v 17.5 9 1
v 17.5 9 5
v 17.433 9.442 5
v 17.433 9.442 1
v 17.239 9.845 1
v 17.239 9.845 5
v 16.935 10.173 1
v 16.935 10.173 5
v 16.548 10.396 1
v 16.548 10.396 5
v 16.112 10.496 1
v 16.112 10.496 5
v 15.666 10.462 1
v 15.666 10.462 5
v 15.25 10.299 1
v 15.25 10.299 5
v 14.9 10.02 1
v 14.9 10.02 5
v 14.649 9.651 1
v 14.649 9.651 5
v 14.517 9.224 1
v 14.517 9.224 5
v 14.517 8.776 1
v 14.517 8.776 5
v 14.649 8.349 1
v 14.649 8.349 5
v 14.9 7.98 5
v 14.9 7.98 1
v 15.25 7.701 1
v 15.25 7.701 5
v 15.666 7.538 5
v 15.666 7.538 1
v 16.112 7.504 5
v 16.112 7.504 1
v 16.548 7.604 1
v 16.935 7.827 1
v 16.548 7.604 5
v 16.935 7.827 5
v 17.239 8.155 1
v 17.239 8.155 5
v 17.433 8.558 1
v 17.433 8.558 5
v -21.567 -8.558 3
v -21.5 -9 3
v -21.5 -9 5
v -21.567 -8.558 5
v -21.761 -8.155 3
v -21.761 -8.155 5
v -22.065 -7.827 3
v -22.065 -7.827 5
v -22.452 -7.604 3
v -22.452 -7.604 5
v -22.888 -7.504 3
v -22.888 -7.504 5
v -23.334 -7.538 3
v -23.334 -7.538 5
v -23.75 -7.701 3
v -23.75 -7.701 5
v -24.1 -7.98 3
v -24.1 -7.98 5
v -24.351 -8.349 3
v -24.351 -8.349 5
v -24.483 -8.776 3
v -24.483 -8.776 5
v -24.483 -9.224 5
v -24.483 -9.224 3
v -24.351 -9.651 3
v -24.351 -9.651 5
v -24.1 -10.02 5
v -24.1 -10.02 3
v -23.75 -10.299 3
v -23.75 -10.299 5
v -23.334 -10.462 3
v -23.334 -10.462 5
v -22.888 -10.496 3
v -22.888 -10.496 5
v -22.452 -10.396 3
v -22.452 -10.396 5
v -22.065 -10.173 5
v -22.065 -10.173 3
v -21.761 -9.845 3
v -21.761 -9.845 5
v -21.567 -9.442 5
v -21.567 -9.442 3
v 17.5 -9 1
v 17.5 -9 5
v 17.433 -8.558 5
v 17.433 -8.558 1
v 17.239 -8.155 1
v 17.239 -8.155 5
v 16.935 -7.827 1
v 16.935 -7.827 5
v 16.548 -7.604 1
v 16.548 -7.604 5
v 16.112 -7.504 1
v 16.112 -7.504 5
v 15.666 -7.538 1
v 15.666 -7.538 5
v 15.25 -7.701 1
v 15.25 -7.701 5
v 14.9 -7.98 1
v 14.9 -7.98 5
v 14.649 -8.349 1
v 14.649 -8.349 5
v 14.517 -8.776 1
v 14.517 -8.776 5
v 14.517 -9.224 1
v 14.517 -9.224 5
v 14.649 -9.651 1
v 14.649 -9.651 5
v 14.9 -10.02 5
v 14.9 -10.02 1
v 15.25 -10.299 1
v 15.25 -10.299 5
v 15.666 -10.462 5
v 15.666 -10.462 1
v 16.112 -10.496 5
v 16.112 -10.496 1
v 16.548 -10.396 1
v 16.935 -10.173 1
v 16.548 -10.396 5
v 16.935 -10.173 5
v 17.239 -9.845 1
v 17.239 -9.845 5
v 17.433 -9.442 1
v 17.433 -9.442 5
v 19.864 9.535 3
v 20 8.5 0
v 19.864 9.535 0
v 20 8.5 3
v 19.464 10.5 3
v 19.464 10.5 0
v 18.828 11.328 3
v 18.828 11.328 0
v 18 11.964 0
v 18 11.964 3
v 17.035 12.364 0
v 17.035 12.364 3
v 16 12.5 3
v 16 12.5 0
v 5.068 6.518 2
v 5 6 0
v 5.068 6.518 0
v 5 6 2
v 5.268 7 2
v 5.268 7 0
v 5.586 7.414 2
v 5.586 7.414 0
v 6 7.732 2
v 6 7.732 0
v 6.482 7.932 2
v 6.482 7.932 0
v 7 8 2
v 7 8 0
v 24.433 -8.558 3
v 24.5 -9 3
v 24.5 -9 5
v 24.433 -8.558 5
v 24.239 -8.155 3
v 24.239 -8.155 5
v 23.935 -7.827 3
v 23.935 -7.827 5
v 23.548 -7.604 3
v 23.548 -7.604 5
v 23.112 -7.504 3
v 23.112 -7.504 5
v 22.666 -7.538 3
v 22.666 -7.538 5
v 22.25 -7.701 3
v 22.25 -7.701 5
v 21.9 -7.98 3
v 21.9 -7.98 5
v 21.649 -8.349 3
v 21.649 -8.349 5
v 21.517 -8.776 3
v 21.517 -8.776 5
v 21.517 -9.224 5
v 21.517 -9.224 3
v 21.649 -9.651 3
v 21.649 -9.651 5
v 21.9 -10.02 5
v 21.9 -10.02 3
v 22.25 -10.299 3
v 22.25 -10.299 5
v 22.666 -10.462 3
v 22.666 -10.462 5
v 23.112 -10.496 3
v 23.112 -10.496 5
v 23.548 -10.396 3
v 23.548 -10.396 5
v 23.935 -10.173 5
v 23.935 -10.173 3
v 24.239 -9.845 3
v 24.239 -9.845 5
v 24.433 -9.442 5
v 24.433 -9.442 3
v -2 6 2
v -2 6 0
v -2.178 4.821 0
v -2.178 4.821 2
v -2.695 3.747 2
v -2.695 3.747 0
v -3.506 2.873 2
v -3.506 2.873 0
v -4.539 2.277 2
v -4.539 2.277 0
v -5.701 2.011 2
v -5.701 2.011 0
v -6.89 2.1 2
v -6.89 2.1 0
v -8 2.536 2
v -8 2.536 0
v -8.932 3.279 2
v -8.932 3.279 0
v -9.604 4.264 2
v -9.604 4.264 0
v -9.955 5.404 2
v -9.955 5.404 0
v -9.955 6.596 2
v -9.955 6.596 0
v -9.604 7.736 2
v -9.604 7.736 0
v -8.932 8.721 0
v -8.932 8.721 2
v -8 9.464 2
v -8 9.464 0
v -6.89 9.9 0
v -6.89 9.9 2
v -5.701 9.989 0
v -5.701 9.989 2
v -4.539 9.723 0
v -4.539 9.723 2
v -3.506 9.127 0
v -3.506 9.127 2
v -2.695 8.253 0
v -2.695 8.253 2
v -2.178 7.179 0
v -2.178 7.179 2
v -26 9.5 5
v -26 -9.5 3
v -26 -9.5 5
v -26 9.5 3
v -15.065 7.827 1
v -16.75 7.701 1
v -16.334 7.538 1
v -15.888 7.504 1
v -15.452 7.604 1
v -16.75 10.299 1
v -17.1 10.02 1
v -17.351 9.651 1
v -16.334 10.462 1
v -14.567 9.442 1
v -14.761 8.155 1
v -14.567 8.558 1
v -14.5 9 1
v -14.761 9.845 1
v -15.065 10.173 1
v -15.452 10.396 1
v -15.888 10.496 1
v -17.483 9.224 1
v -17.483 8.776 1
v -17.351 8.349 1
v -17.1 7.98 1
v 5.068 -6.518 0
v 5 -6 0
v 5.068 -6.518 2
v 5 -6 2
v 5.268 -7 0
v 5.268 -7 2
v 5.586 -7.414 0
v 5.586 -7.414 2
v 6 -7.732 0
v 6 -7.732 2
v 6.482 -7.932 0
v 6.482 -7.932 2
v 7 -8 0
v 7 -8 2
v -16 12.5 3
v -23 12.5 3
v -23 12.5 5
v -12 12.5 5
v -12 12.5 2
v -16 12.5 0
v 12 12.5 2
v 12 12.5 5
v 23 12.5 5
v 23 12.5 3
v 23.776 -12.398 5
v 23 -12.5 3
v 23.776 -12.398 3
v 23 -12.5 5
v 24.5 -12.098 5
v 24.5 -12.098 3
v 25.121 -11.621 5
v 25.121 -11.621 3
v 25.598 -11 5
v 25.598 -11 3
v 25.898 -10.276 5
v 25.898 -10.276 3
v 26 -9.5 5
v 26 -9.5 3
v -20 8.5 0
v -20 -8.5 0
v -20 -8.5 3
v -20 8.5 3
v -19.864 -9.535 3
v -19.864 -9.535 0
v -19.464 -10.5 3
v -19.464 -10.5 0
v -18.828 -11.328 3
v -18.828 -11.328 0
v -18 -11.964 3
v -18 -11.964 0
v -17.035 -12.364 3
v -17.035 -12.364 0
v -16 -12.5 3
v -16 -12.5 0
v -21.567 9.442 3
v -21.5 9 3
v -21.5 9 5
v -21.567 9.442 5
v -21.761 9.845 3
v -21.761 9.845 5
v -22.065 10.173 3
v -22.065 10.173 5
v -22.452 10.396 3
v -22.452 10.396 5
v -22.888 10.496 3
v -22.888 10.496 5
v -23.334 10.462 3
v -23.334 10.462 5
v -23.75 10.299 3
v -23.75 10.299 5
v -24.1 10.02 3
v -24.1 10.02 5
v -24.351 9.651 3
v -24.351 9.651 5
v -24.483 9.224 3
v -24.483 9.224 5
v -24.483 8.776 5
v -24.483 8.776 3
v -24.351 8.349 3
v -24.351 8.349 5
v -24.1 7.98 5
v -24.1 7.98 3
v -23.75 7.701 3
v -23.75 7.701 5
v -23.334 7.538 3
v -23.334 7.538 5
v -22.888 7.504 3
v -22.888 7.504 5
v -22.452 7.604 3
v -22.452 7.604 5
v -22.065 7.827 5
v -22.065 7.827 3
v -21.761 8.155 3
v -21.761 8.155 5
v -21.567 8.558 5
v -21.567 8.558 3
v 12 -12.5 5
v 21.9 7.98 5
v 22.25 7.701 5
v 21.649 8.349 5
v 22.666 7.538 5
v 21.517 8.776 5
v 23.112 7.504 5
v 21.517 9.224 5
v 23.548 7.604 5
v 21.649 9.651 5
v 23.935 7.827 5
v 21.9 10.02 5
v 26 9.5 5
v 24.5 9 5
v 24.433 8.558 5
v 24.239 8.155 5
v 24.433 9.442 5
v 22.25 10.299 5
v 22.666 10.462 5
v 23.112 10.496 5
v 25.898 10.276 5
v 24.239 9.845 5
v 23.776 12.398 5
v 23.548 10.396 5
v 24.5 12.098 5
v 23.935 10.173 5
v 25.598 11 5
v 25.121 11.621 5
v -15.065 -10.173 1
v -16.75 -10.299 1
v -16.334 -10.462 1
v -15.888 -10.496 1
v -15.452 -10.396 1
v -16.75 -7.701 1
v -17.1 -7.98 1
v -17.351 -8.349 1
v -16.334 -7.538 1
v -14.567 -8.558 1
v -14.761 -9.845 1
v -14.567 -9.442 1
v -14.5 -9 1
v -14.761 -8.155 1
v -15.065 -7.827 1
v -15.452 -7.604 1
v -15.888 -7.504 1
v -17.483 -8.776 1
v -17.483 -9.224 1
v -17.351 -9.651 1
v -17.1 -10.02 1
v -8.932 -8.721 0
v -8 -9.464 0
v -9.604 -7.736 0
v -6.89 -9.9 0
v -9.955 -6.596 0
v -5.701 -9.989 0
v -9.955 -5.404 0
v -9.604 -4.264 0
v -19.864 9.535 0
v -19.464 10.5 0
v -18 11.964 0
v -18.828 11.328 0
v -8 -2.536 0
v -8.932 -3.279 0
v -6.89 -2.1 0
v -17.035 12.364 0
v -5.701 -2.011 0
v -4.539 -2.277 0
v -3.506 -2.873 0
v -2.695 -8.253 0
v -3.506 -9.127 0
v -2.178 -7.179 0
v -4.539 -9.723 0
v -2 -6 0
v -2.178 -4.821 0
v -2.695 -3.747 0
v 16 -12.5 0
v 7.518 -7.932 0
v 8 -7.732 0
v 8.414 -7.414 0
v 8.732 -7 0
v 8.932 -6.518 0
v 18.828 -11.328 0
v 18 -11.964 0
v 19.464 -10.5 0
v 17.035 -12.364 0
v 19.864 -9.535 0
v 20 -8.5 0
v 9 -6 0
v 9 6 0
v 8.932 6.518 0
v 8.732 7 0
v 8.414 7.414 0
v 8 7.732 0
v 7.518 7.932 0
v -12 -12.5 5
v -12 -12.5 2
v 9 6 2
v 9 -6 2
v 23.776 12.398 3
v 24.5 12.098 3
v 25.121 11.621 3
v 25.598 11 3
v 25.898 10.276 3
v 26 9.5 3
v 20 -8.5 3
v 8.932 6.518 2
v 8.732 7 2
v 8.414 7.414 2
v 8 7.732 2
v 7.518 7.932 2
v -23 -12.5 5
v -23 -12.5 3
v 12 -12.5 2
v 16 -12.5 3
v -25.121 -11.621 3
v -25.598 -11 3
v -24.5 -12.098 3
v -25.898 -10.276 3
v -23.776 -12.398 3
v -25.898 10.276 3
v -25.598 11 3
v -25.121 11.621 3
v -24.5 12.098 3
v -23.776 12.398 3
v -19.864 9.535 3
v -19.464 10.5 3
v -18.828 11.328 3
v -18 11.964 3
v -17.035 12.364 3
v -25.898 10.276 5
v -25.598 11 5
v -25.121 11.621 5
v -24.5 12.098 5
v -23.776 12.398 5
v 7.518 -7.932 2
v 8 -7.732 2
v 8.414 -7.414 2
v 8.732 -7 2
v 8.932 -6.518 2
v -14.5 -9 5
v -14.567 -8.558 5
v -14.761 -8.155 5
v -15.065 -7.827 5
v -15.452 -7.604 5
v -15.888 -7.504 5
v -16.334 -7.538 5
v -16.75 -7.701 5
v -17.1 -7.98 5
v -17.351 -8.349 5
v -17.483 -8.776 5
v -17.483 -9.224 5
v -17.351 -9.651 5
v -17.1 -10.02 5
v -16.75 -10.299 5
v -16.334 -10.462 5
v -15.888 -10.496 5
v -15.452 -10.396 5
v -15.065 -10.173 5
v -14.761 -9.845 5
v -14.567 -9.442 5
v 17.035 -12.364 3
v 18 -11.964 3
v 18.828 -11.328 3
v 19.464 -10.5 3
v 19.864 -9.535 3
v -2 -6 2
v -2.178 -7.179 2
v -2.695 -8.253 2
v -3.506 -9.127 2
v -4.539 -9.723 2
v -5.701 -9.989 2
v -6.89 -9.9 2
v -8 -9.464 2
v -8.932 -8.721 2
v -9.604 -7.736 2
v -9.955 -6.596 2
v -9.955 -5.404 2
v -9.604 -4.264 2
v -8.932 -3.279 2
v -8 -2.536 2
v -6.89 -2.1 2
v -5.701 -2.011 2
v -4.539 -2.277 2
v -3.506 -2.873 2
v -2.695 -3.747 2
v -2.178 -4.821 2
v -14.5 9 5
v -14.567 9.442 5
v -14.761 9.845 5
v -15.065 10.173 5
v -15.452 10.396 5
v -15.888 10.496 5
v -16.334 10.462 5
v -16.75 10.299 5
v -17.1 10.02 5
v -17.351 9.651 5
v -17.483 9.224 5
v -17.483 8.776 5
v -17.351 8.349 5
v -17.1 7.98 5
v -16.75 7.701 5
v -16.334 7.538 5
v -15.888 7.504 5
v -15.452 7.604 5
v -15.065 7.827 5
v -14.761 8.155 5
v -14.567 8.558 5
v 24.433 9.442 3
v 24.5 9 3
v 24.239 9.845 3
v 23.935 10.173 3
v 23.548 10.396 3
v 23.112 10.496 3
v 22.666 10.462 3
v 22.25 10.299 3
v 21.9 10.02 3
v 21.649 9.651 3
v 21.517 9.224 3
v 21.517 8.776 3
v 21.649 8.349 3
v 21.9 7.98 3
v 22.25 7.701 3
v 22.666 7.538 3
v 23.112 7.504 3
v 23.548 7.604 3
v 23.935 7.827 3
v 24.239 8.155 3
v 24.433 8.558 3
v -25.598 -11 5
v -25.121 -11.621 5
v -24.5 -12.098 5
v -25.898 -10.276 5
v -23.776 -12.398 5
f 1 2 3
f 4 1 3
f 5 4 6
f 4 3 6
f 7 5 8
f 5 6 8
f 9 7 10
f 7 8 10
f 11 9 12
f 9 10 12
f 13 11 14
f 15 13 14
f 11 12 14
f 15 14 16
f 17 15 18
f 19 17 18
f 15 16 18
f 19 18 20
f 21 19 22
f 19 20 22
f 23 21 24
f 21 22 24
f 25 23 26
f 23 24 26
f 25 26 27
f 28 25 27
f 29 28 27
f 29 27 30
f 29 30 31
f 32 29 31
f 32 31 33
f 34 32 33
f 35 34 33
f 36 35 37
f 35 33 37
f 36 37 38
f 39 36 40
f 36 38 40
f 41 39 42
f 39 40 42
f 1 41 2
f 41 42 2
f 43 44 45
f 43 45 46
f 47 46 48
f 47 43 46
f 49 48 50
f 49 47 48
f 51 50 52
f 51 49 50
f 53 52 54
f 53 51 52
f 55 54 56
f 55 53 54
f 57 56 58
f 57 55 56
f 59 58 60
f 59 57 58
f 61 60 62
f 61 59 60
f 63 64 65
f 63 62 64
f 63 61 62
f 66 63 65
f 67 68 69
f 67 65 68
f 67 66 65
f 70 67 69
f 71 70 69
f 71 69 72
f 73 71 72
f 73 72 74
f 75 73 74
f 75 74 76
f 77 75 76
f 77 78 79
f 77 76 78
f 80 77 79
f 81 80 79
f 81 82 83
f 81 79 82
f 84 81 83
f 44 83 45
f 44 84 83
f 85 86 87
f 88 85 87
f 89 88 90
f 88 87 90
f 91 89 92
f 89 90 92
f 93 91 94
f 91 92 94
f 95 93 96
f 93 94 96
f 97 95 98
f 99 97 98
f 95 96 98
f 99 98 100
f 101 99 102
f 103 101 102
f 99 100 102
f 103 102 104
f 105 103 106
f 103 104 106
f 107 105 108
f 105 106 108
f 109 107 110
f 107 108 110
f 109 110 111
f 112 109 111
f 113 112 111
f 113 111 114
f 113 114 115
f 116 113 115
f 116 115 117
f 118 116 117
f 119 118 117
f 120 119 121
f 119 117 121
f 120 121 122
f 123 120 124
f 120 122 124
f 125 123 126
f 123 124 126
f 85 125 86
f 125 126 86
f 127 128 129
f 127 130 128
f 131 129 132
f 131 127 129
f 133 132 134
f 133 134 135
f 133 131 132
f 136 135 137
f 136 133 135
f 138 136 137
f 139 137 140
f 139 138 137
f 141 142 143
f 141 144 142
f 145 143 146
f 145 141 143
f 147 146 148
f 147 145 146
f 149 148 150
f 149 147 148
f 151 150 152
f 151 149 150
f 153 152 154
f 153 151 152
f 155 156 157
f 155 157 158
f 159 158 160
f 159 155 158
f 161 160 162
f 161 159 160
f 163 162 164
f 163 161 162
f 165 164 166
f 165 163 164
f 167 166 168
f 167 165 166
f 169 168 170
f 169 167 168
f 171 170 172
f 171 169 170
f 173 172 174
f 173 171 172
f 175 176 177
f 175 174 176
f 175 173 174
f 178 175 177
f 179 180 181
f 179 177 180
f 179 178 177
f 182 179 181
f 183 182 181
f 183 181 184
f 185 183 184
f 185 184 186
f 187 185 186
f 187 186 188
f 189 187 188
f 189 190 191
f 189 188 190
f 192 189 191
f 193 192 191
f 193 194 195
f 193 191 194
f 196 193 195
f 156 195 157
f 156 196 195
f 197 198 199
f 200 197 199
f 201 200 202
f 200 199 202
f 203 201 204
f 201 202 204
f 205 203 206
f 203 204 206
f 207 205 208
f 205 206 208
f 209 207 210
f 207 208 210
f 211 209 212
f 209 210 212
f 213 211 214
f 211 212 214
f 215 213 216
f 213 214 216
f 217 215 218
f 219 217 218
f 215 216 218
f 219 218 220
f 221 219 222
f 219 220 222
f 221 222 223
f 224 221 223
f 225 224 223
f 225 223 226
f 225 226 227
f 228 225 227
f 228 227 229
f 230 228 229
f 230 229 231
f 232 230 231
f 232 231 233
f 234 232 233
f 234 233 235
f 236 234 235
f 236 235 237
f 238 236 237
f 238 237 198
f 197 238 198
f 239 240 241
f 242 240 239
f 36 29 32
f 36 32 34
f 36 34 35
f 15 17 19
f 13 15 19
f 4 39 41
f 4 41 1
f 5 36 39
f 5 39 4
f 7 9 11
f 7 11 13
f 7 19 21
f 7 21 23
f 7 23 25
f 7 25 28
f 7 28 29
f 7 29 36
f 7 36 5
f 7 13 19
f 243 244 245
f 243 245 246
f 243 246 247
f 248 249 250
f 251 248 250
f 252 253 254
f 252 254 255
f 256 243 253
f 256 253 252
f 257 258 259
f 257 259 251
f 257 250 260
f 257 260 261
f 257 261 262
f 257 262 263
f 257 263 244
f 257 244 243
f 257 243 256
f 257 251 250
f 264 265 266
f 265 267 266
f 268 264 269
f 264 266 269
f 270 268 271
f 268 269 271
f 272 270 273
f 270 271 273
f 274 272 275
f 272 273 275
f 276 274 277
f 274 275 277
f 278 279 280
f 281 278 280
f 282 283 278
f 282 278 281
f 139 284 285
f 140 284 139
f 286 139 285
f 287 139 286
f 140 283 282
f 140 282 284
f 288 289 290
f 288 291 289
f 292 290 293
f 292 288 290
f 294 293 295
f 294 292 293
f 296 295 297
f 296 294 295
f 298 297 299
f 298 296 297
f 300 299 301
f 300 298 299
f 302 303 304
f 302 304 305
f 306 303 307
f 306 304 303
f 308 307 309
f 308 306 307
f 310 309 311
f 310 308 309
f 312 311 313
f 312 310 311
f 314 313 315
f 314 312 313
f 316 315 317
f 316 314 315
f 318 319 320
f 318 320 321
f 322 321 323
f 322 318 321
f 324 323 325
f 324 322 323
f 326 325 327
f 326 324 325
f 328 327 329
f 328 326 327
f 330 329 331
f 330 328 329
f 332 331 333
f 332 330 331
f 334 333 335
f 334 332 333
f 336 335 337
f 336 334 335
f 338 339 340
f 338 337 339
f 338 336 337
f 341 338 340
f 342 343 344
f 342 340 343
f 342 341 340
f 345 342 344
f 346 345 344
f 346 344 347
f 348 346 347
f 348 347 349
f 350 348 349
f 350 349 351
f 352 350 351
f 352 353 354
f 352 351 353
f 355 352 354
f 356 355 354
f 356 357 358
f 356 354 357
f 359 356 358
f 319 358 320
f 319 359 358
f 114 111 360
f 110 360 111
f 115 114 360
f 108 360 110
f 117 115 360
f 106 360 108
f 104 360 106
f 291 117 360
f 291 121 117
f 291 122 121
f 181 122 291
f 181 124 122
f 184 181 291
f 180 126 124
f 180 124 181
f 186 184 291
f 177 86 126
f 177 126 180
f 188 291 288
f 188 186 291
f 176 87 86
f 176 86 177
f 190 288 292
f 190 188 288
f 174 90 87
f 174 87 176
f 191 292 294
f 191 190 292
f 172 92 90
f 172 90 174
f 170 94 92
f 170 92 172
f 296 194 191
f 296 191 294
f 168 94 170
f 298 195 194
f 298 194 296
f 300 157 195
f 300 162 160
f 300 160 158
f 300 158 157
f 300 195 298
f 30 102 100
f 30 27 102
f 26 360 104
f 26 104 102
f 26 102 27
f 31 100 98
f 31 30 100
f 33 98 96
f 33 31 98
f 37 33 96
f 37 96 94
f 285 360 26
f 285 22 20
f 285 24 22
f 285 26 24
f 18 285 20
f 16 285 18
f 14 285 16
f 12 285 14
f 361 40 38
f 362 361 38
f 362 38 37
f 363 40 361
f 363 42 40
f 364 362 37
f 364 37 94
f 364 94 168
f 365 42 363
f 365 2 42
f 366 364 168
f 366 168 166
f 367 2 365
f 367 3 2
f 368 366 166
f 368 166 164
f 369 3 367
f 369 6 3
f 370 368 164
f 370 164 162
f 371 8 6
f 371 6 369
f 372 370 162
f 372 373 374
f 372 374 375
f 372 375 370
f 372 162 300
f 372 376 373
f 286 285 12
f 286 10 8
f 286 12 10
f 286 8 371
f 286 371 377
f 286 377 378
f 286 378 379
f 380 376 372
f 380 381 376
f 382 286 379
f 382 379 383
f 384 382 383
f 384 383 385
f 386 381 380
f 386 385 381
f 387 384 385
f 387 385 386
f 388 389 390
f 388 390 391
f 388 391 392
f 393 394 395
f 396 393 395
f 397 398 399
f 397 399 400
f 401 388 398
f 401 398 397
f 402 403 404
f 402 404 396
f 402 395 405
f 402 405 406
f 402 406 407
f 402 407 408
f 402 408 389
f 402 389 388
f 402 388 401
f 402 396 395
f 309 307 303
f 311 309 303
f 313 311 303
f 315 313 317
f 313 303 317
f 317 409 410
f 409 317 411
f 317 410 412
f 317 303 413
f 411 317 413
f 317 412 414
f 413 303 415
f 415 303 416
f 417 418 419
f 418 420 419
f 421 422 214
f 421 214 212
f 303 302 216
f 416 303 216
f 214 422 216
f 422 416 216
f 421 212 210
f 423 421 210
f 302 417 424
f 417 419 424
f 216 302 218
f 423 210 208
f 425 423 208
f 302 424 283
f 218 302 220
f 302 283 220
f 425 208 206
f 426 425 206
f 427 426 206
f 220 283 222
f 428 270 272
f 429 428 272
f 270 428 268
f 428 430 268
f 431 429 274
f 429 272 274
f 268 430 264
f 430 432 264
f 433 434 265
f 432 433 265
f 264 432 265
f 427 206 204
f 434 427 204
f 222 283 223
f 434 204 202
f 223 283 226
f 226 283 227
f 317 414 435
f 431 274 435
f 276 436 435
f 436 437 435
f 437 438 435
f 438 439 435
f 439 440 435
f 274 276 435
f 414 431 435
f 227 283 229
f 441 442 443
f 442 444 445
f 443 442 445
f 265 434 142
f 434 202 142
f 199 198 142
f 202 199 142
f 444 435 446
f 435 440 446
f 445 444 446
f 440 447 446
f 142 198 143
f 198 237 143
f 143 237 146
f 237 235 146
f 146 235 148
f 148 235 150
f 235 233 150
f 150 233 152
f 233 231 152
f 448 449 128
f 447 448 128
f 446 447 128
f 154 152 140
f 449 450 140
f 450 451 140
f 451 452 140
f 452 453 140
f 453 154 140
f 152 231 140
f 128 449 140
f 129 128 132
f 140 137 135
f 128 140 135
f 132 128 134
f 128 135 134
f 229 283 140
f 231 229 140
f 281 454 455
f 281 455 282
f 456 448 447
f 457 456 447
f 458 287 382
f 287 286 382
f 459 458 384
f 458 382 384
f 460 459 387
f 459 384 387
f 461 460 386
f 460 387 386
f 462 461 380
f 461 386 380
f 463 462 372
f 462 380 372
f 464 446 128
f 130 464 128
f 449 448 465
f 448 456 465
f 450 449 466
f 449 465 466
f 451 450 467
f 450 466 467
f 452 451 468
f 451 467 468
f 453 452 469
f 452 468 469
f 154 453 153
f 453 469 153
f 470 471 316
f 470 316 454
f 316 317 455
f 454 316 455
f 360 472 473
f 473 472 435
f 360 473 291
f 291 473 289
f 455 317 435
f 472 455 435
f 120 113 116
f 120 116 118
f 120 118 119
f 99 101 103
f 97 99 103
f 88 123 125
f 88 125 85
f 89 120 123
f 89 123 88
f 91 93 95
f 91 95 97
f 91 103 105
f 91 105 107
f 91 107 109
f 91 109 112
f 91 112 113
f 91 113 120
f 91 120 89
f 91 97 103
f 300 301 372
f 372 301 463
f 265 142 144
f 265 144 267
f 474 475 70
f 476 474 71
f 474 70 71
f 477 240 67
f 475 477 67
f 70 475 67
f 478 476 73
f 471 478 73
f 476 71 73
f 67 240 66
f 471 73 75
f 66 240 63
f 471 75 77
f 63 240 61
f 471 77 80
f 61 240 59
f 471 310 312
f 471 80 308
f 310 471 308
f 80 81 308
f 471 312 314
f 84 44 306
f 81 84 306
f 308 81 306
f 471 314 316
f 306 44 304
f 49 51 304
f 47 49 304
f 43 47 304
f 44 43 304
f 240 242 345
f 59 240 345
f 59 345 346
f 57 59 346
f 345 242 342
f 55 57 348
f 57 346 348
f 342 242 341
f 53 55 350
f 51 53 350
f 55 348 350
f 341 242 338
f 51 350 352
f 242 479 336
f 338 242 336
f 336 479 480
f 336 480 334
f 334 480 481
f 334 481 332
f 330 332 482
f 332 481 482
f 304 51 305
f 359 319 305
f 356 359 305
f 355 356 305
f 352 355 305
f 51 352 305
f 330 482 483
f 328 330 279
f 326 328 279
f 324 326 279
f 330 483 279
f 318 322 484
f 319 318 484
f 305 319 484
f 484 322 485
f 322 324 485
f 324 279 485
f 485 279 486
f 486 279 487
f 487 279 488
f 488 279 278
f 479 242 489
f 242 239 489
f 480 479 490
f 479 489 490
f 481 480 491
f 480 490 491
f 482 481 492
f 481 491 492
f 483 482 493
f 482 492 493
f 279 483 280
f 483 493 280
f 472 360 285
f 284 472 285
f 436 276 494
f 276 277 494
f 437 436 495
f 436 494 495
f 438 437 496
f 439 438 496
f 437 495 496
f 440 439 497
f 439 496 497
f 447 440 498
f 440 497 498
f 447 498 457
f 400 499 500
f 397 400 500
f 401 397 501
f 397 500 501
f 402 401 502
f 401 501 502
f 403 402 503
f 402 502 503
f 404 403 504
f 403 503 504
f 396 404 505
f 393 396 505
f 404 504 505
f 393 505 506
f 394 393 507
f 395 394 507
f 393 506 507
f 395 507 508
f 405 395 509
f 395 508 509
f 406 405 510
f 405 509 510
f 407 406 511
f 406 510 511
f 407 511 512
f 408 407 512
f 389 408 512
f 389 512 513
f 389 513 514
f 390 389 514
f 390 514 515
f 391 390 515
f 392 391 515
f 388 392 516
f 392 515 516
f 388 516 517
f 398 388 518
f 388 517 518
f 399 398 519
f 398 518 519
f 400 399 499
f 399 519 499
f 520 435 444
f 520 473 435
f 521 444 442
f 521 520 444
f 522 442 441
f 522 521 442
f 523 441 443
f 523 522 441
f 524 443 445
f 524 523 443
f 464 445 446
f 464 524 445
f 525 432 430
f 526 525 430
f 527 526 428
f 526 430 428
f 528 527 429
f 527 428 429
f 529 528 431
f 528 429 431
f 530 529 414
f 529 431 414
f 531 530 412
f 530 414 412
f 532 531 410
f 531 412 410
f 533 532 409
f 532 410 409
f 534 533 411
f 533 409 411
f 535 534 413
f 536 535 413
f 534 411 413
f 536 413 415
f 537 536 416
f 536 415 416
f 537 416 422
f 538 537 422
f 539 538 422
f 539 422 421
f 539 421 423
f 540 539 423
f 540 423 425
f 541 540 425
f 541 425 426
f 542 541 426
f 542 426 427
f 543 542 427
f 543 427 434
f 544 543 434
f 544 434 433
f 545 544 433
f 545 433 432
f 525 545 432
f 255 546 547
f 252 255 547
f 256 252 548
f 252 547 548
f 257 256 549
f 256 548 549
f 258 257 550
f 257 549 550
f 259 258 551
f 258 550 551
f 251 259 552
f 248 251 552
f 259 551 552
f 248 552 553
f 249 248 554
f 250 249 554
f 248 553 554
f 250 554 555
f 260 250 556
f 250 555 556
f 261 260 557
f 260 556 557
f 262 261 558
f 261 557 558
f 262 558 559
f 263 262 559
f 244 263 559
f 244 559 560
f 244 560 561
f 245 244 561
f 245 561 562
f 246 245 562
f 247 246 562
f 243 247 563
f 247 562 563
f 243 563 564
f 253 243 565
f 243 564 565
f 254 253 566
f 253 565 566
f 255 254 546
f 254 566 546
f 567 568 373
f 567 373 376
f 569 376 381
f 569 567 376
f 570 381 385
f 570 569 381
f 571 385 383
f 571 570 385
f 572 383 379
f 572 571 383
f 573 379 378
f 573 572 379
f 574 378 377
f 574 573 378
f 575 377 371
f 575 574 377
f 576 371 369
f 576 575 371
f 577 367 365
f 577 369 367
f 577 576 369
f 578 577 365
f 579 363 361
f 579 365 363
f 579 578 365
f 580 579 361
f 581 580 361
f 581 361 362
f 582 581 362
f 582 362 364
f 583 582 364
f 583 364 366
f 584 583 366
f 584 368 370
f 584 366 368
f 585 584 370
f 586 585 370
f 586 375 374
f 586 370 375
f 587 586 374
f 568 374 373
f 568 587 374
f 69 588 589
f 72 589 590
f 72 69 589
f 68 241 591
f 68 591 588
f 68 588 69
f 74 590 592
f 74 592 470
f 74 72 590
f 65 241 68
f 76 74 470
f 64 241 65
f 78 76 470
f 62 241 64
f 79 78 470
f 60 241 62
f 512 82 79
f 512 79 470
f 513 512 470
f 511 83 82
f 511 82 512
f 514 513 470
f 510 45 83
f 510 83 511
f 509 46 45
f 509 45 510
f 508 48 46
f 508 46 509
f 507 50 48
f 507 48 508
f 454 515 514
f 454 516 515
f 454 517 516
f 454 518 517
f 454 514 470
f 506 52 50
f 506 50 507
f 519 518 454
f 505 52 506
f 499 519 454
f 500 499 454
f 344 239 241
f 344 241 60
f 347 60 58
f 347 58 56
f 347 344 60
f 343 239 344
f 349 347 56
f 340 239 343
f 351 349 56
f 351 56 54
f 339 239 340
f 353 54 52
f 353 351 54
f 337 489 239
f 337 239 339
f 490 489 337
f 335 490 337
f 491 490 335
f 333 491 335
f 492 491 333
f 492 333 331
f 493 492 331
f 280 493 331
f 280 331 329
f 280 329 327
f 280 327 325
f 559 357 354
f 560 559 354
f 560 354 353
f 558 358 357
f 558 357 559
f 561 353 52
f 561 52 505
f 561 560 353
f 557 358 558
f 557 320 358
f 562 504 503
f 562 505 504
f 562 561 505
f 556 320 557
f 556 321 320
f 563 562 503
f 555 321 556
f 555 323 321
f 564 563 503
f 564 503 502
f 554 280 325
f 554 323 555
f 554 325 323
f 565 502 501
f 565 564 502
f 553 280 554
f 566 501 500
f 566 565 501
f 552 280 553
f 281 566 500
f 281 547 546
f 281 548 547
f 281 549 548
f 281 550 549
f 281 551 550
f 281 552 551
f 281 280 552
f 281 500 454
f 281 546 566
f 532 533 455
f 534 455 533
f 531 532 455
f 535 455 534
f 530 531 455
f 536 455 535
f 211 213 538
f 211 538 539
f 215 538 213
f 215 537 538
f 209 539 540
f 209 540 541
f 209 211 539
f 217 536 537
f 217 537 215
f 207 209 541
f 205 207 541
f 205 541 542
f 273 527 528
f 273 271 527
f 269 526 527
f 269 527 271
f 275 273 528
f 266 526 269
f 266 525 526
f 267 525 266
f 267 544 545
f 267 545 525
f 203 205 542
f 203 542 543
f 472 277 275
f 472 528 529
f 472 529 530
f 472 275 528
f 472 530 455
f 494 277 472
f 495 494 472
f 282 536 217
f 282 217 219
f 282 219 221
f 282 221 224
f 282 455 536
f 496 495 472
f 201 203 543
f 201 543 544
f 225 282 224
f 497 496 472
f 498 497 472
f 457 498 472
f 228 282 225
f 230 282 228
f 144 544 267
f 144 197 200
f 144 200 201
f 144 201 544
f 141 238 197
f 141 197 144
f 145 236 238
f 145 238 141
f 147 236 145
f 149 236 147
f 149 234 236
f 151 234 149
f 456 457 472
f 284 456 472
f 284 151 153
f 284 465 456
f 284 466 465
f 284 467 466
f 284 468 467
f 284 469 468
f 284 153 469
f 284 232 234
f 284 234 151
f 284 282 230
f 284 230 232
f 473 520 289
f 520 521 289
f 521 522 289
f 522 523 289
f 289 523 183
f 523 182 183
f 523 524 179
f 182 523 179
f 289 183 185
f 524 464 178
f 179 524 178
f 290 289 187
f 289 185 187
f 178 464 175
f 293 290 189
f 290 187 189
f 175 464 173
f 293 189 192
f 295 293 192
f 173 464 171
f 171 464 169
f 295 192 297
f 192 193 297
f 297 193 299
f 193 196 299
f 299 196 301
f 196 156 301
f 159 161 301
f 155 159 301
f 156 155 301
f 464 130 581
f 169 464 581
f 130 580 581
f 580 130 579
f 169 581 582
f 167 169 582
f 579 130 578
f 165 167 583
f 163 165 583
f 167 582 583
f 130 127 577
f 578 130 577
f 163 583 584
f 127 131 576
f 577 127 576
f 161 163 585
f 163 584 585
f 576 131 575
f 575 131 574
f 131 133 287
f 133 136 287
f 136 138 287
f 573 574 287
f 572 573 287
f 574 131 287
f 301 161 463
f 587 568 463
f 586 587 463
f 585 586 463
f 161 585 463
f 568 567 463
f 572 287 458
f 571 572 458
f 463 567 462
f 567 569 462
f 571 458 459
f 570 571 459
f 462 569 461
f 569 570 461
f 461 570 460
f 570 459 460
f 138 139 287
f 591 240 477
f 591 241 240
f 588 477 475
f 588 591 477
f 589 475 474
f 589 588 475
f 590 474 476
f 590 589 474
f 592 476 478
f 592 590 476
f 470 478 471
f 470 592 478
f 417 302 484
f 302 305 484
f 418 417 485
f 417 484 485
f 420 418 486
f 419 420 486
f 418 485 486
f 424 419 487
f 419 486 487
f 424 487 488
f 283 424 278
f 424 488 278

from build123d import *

# Parameters (mm, degrees)
F0_W      = 40
F0_H      = 25
F1_DEPTH  = 3
F2_R      = 4
F3_W      = 52
F3_H      = 25
F4_DEPTH  = 2
F5_R      = 3
F6_R      = 1.5
F7_DEPTH  = 25
F8_R      = 1.5
F9_DEPTH  = 4
F10_W     = 24
F10_H     = 25
F11_DEPTH = 3
F12_W     = 4
F12_H     = 16
F12_R     = 4
F13_DEPTH = 25
F14_R     = 1.99999


# Not quite as in the source:
# - a fillet or chamfer is up to 0.001 mm smaller than in the source, because OpenCascade refuses the exact size


with BuildPart() as f1:
    # F0 (on Top) → F1 (new body)
    with BuildSketch(Plane.XY):
        Rectangle(F0_W, F0_H)
    extrude(amount=F1_DEPTH)

    # F2
    f2_edges = [f1.edges().sort_by_distance(p)[0] for p in [
        (-20, -12.5, 1.5),
        (-20, 12.5, 1.5),
        (20, -12.5, 1.5),
        (20, 12.5, 1.5),
    ]]
    fillet(f2_edges, radius=F2_R)

    # F3 (on face) → F4 (join)
    with BuildSketch(Plane.XY.offset(3)):
        Rectangle(F3_W, F3_H)
    extrude(amount=F4_DEPTH)

    # F5
    f5_edges = [f1.edges().sort_by_distance(p)[0] for p in [
        (26, 12.5, 4),
        (26, -12.5, 4),
        (-26, -12.5, 4),
        (-26, 12.5, 4),
    ]]
    fillet(f5_edges, radius=F5_R)

    # F6 (on Top) → F7 (cut)
    with BuildSketch(Plane.XY):
        with Locations((23, 9)):
            Circle(F6_R)
        with Locations((23, -9)):
            Circle(F6_R)
        with Locations((-23, -9)):
            Circle(F6_R)
        with Locations((-23, 9)):
            Circle(F6_R)
    extrude(amount=F7_DEPTH, mode=Mode.SUBTRACT)

    # F8 (on face) → F9 (cut)
    with BuildSketch(Plane.XY.offset(5)):
        with Locations((16, -9)):
            Circle(F8_R)
        with Locations((-16, -9)):
            Circle(F8_R)
        with Locations((-16, 9)):
            Circle(F8_R)
        with Locations((16, 9)):
            Circle(F8_R)
    extrude(amount=-F9_DEPTH, mode=Mode.SUBTRACT)

    # F10 (on face) → F11 (cut)
    with BuildSketch(Plane.XY.offset(5)):
        Rectangle(F10_W, F10_H)
    extrude(amount=-F11_DEPTH, mode=Mode.SUBTRACT)

    # F12 (on face) → F13 (cut)
    with BuildSketch(Plane(origin=(0, 0, 0), x_dir=(1, 0, 0), z_dir=(0, 0, -1))):
        with Locations((7, 0)):
            Rectangle(F12_W, F12_H)
        with Locations((-6, -6)):
            Circle(F12_R)
        with Locations((-6, 6)):
            Circle(F12_R)
    extrude(amount=-F13_DEPTH, mode=Mode.SUBTRACT)

    # F14 (radius 2 in the source; OpenCascade refuses exactly that, so slightly less here)
    f14_edges = [f1.edges().sort_by_distance(p)[0] for p in [
        (9, 8, 1),
        (5, 8, 1),
        (9, -8, 1),
        (5, -8, 1),
    ]]
    fillet(f14_edges, radius=F14_R)


solid = f1.part
